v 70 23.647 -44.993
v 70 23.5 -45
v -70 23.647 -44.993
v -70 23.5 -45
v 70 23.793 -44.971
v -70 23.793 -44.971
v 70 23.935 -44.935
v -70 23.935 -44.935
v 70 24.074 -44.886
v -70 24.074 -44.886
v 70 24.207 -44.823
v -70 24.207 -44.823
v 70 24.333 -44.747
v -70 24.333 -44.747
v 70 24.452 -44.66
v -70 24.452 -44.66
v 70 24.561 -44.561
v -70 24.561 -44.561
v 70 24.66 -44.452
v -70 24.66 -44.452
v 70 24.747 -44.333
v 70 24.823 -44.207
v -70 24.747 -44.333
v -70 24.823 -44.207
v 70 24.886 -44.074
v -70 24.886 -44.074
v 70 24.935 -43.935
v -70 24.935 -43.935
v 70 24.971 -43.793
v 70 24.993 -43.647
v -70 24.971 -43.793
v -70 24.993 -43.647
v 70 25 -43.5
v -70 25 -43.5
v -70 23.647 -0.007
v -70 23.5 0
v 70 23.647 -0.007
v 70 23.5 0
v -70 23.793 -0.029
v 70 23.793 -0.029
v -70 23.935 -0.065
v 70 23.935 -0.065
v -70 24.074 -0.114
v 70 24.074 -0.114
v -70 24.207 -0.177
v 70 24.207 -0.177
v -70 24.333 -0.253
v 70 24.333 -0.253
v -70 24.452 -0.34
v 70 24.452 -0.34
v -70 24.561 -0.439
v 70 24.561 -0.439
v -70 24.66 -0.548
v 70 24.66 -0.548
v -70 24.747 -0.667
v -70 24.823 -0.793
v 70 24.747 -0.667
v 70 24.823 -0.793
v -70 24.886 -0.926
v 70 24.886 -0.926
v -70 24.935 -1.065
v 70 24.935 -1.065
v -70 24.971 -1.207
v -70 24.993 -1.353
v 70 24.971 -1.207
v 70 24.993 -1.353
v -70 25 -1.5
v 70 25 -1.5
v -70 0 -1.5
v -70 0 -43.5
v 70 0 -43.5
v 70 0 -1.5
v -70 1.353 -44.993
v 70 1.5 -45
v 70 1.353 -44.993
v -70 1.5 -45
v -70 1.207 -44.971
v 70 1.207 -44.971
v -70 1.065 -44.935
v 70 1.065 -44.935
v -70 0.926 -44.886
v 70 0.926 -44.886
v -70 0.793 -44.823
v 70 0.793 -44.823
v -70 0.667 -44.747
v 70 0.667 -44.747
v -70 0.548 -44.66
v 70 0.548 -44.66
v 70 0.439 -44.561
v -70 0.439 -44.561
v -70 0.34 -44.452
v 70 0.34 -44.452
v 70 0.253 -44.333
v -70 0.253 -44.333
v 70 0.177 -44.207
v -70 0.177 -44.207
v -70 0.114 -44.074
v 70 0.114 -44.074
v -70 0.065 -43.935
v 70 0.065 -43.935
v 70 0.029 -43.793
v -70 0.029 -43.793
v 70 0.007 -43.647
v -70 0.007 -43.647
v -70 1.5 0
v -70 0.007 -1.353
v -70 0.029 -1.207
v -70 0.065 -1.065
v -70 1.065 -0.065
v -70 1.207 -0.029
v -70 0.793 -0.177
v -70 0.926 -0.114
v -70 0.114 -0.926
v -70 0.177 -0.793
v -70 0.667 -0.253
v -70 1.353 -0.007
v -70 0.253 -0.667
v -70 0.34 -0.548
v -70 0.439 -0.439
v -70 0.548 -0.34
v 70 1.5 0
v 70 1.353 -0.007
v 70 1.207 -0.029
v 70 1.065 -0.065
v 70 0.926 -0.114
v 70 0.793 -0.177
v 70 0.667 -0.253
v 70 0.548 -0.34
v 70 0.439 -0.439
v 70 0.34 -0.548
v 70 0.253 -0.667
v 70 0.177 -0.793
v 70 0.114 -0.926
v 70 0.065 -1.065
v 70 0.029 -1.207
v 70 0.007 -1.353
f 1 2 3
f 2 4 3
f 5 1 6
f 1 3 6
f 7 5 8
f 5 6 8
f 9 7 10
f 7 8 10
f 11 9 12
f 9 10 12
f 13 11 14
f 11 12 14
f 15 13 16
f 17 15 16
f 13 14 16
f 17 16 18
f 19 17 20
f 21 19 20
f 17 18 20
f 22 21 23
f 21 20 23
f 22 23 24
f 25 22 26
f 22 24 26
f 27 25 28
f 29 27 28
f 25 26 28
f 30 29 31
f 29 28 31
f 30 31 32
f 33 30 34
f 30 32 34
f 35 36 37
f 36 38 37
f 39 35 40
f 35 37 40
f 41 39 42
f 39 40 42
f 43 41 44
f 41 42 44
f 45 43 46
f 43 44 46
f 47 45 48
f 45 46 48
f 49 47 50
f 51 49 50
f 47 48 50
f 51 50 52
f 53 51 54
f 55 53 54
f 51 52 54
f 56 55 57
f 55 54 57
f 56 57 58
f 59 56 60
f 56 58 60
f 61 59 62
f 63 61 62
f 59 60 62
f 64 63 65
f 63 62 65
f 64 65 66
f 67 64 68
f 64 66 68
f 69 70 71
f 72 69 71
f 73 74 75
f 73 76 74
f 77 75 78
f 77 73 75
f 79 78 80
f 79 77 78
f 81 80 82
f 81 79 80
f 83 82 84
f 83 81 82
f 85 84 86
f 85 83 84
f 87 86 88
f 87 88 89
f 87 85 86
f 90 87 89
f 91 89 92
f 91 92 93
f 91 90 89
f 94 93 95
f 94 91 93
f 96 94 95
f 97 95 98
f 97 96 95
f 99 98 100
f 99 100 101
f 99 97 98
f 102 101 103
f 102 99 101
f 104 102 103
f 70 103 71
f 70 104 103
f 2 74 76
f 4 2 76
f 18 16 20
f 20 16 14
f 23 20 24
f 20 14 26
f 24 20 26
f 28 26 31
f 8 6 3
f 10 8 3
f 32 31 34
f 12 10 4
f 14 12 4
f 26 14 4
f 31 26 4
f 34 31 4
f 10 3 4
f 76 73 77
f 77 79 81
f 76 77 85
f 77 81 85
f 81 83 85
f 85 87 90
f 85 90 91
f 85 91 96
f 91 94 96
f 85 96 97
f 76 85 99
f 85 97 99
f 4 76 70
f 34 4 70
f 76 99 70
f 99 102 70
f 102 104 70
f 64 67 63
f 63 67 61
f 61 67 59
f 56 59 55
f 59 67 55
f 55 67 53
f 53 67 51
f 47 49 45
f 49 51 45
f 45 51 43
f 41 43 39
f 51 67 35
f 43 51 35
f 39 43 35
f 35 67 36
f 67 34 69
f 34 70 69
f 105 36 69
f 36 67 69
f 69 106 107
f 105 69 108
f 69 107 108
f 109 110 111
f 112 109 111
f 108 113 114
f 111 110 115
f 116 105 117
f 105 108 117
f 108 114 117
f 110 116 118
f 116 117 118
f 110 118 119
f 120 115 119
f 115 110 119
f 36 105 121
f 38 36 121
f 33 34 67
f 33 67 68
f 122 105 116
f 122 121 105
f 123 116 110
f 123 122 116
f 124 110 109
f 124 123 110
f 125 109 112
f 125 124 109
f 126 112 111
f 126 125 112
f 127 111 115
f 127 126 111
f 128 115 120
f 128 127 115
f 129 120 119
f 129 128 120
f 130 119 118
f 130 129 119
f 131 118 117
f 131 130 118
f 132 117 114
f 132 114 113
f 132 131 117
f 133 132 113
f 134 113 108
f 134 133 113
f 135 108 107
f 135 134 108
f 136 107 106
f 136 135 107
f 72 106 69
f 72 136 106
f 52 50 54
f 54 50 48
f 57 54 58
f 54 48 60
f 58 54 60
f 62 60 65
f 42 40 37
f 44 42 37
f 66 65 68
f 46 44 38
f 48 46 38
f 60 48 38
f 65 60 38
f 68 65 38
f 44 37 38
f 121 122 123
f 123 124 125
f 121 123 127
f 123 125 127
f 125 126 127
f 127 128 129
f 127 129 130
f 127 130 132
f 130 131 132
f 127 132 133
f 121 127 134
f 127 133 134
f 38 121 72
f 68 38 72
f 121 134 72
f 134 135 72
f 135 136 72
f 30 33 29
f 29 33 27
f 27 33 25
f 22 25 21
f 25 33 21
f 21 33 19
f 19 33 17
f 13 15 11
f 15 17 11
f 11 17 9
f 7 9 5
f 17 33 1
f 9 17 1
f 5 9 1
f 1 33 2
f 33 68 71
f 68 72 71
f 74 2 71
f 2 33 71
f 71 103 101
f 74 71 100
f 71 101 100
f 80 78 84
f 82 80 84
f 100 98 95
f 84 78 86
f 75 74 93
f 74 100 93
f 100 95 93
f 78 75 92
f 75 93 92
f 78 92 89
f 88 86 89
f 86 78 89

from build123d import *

# Parameters (mm, degrees)
BOSS_EXTRU_1_DEPTH = 25
CONG_1_R           = 1.5


with BuildPart() as part:
    # Esquisse2 → Boss.-Extru.1 (new body)
    with BuildSketch(Plane(origin=(0, 0, 0), x_dir=(1, 0, 0), z_dir=(0, 1, 0))):
        Polygon((0, 0), (70, 0), (70, 45), (-70, 45), (-70, 0), align=None)
    extrude(amount=BOSS_EXTRU_1_DEPTH)

    # Congé1
    cong_1_edges = [part.edges().sort_by_distance(p)[0] for p in [
        (0, 25, -45),
        (0, 25, 0),
        (0, 0, -45),
        (0, 0, 0),
    ]]
    fillet(cong_1_edges, radius=CONG_1_R)


solid = part.part
